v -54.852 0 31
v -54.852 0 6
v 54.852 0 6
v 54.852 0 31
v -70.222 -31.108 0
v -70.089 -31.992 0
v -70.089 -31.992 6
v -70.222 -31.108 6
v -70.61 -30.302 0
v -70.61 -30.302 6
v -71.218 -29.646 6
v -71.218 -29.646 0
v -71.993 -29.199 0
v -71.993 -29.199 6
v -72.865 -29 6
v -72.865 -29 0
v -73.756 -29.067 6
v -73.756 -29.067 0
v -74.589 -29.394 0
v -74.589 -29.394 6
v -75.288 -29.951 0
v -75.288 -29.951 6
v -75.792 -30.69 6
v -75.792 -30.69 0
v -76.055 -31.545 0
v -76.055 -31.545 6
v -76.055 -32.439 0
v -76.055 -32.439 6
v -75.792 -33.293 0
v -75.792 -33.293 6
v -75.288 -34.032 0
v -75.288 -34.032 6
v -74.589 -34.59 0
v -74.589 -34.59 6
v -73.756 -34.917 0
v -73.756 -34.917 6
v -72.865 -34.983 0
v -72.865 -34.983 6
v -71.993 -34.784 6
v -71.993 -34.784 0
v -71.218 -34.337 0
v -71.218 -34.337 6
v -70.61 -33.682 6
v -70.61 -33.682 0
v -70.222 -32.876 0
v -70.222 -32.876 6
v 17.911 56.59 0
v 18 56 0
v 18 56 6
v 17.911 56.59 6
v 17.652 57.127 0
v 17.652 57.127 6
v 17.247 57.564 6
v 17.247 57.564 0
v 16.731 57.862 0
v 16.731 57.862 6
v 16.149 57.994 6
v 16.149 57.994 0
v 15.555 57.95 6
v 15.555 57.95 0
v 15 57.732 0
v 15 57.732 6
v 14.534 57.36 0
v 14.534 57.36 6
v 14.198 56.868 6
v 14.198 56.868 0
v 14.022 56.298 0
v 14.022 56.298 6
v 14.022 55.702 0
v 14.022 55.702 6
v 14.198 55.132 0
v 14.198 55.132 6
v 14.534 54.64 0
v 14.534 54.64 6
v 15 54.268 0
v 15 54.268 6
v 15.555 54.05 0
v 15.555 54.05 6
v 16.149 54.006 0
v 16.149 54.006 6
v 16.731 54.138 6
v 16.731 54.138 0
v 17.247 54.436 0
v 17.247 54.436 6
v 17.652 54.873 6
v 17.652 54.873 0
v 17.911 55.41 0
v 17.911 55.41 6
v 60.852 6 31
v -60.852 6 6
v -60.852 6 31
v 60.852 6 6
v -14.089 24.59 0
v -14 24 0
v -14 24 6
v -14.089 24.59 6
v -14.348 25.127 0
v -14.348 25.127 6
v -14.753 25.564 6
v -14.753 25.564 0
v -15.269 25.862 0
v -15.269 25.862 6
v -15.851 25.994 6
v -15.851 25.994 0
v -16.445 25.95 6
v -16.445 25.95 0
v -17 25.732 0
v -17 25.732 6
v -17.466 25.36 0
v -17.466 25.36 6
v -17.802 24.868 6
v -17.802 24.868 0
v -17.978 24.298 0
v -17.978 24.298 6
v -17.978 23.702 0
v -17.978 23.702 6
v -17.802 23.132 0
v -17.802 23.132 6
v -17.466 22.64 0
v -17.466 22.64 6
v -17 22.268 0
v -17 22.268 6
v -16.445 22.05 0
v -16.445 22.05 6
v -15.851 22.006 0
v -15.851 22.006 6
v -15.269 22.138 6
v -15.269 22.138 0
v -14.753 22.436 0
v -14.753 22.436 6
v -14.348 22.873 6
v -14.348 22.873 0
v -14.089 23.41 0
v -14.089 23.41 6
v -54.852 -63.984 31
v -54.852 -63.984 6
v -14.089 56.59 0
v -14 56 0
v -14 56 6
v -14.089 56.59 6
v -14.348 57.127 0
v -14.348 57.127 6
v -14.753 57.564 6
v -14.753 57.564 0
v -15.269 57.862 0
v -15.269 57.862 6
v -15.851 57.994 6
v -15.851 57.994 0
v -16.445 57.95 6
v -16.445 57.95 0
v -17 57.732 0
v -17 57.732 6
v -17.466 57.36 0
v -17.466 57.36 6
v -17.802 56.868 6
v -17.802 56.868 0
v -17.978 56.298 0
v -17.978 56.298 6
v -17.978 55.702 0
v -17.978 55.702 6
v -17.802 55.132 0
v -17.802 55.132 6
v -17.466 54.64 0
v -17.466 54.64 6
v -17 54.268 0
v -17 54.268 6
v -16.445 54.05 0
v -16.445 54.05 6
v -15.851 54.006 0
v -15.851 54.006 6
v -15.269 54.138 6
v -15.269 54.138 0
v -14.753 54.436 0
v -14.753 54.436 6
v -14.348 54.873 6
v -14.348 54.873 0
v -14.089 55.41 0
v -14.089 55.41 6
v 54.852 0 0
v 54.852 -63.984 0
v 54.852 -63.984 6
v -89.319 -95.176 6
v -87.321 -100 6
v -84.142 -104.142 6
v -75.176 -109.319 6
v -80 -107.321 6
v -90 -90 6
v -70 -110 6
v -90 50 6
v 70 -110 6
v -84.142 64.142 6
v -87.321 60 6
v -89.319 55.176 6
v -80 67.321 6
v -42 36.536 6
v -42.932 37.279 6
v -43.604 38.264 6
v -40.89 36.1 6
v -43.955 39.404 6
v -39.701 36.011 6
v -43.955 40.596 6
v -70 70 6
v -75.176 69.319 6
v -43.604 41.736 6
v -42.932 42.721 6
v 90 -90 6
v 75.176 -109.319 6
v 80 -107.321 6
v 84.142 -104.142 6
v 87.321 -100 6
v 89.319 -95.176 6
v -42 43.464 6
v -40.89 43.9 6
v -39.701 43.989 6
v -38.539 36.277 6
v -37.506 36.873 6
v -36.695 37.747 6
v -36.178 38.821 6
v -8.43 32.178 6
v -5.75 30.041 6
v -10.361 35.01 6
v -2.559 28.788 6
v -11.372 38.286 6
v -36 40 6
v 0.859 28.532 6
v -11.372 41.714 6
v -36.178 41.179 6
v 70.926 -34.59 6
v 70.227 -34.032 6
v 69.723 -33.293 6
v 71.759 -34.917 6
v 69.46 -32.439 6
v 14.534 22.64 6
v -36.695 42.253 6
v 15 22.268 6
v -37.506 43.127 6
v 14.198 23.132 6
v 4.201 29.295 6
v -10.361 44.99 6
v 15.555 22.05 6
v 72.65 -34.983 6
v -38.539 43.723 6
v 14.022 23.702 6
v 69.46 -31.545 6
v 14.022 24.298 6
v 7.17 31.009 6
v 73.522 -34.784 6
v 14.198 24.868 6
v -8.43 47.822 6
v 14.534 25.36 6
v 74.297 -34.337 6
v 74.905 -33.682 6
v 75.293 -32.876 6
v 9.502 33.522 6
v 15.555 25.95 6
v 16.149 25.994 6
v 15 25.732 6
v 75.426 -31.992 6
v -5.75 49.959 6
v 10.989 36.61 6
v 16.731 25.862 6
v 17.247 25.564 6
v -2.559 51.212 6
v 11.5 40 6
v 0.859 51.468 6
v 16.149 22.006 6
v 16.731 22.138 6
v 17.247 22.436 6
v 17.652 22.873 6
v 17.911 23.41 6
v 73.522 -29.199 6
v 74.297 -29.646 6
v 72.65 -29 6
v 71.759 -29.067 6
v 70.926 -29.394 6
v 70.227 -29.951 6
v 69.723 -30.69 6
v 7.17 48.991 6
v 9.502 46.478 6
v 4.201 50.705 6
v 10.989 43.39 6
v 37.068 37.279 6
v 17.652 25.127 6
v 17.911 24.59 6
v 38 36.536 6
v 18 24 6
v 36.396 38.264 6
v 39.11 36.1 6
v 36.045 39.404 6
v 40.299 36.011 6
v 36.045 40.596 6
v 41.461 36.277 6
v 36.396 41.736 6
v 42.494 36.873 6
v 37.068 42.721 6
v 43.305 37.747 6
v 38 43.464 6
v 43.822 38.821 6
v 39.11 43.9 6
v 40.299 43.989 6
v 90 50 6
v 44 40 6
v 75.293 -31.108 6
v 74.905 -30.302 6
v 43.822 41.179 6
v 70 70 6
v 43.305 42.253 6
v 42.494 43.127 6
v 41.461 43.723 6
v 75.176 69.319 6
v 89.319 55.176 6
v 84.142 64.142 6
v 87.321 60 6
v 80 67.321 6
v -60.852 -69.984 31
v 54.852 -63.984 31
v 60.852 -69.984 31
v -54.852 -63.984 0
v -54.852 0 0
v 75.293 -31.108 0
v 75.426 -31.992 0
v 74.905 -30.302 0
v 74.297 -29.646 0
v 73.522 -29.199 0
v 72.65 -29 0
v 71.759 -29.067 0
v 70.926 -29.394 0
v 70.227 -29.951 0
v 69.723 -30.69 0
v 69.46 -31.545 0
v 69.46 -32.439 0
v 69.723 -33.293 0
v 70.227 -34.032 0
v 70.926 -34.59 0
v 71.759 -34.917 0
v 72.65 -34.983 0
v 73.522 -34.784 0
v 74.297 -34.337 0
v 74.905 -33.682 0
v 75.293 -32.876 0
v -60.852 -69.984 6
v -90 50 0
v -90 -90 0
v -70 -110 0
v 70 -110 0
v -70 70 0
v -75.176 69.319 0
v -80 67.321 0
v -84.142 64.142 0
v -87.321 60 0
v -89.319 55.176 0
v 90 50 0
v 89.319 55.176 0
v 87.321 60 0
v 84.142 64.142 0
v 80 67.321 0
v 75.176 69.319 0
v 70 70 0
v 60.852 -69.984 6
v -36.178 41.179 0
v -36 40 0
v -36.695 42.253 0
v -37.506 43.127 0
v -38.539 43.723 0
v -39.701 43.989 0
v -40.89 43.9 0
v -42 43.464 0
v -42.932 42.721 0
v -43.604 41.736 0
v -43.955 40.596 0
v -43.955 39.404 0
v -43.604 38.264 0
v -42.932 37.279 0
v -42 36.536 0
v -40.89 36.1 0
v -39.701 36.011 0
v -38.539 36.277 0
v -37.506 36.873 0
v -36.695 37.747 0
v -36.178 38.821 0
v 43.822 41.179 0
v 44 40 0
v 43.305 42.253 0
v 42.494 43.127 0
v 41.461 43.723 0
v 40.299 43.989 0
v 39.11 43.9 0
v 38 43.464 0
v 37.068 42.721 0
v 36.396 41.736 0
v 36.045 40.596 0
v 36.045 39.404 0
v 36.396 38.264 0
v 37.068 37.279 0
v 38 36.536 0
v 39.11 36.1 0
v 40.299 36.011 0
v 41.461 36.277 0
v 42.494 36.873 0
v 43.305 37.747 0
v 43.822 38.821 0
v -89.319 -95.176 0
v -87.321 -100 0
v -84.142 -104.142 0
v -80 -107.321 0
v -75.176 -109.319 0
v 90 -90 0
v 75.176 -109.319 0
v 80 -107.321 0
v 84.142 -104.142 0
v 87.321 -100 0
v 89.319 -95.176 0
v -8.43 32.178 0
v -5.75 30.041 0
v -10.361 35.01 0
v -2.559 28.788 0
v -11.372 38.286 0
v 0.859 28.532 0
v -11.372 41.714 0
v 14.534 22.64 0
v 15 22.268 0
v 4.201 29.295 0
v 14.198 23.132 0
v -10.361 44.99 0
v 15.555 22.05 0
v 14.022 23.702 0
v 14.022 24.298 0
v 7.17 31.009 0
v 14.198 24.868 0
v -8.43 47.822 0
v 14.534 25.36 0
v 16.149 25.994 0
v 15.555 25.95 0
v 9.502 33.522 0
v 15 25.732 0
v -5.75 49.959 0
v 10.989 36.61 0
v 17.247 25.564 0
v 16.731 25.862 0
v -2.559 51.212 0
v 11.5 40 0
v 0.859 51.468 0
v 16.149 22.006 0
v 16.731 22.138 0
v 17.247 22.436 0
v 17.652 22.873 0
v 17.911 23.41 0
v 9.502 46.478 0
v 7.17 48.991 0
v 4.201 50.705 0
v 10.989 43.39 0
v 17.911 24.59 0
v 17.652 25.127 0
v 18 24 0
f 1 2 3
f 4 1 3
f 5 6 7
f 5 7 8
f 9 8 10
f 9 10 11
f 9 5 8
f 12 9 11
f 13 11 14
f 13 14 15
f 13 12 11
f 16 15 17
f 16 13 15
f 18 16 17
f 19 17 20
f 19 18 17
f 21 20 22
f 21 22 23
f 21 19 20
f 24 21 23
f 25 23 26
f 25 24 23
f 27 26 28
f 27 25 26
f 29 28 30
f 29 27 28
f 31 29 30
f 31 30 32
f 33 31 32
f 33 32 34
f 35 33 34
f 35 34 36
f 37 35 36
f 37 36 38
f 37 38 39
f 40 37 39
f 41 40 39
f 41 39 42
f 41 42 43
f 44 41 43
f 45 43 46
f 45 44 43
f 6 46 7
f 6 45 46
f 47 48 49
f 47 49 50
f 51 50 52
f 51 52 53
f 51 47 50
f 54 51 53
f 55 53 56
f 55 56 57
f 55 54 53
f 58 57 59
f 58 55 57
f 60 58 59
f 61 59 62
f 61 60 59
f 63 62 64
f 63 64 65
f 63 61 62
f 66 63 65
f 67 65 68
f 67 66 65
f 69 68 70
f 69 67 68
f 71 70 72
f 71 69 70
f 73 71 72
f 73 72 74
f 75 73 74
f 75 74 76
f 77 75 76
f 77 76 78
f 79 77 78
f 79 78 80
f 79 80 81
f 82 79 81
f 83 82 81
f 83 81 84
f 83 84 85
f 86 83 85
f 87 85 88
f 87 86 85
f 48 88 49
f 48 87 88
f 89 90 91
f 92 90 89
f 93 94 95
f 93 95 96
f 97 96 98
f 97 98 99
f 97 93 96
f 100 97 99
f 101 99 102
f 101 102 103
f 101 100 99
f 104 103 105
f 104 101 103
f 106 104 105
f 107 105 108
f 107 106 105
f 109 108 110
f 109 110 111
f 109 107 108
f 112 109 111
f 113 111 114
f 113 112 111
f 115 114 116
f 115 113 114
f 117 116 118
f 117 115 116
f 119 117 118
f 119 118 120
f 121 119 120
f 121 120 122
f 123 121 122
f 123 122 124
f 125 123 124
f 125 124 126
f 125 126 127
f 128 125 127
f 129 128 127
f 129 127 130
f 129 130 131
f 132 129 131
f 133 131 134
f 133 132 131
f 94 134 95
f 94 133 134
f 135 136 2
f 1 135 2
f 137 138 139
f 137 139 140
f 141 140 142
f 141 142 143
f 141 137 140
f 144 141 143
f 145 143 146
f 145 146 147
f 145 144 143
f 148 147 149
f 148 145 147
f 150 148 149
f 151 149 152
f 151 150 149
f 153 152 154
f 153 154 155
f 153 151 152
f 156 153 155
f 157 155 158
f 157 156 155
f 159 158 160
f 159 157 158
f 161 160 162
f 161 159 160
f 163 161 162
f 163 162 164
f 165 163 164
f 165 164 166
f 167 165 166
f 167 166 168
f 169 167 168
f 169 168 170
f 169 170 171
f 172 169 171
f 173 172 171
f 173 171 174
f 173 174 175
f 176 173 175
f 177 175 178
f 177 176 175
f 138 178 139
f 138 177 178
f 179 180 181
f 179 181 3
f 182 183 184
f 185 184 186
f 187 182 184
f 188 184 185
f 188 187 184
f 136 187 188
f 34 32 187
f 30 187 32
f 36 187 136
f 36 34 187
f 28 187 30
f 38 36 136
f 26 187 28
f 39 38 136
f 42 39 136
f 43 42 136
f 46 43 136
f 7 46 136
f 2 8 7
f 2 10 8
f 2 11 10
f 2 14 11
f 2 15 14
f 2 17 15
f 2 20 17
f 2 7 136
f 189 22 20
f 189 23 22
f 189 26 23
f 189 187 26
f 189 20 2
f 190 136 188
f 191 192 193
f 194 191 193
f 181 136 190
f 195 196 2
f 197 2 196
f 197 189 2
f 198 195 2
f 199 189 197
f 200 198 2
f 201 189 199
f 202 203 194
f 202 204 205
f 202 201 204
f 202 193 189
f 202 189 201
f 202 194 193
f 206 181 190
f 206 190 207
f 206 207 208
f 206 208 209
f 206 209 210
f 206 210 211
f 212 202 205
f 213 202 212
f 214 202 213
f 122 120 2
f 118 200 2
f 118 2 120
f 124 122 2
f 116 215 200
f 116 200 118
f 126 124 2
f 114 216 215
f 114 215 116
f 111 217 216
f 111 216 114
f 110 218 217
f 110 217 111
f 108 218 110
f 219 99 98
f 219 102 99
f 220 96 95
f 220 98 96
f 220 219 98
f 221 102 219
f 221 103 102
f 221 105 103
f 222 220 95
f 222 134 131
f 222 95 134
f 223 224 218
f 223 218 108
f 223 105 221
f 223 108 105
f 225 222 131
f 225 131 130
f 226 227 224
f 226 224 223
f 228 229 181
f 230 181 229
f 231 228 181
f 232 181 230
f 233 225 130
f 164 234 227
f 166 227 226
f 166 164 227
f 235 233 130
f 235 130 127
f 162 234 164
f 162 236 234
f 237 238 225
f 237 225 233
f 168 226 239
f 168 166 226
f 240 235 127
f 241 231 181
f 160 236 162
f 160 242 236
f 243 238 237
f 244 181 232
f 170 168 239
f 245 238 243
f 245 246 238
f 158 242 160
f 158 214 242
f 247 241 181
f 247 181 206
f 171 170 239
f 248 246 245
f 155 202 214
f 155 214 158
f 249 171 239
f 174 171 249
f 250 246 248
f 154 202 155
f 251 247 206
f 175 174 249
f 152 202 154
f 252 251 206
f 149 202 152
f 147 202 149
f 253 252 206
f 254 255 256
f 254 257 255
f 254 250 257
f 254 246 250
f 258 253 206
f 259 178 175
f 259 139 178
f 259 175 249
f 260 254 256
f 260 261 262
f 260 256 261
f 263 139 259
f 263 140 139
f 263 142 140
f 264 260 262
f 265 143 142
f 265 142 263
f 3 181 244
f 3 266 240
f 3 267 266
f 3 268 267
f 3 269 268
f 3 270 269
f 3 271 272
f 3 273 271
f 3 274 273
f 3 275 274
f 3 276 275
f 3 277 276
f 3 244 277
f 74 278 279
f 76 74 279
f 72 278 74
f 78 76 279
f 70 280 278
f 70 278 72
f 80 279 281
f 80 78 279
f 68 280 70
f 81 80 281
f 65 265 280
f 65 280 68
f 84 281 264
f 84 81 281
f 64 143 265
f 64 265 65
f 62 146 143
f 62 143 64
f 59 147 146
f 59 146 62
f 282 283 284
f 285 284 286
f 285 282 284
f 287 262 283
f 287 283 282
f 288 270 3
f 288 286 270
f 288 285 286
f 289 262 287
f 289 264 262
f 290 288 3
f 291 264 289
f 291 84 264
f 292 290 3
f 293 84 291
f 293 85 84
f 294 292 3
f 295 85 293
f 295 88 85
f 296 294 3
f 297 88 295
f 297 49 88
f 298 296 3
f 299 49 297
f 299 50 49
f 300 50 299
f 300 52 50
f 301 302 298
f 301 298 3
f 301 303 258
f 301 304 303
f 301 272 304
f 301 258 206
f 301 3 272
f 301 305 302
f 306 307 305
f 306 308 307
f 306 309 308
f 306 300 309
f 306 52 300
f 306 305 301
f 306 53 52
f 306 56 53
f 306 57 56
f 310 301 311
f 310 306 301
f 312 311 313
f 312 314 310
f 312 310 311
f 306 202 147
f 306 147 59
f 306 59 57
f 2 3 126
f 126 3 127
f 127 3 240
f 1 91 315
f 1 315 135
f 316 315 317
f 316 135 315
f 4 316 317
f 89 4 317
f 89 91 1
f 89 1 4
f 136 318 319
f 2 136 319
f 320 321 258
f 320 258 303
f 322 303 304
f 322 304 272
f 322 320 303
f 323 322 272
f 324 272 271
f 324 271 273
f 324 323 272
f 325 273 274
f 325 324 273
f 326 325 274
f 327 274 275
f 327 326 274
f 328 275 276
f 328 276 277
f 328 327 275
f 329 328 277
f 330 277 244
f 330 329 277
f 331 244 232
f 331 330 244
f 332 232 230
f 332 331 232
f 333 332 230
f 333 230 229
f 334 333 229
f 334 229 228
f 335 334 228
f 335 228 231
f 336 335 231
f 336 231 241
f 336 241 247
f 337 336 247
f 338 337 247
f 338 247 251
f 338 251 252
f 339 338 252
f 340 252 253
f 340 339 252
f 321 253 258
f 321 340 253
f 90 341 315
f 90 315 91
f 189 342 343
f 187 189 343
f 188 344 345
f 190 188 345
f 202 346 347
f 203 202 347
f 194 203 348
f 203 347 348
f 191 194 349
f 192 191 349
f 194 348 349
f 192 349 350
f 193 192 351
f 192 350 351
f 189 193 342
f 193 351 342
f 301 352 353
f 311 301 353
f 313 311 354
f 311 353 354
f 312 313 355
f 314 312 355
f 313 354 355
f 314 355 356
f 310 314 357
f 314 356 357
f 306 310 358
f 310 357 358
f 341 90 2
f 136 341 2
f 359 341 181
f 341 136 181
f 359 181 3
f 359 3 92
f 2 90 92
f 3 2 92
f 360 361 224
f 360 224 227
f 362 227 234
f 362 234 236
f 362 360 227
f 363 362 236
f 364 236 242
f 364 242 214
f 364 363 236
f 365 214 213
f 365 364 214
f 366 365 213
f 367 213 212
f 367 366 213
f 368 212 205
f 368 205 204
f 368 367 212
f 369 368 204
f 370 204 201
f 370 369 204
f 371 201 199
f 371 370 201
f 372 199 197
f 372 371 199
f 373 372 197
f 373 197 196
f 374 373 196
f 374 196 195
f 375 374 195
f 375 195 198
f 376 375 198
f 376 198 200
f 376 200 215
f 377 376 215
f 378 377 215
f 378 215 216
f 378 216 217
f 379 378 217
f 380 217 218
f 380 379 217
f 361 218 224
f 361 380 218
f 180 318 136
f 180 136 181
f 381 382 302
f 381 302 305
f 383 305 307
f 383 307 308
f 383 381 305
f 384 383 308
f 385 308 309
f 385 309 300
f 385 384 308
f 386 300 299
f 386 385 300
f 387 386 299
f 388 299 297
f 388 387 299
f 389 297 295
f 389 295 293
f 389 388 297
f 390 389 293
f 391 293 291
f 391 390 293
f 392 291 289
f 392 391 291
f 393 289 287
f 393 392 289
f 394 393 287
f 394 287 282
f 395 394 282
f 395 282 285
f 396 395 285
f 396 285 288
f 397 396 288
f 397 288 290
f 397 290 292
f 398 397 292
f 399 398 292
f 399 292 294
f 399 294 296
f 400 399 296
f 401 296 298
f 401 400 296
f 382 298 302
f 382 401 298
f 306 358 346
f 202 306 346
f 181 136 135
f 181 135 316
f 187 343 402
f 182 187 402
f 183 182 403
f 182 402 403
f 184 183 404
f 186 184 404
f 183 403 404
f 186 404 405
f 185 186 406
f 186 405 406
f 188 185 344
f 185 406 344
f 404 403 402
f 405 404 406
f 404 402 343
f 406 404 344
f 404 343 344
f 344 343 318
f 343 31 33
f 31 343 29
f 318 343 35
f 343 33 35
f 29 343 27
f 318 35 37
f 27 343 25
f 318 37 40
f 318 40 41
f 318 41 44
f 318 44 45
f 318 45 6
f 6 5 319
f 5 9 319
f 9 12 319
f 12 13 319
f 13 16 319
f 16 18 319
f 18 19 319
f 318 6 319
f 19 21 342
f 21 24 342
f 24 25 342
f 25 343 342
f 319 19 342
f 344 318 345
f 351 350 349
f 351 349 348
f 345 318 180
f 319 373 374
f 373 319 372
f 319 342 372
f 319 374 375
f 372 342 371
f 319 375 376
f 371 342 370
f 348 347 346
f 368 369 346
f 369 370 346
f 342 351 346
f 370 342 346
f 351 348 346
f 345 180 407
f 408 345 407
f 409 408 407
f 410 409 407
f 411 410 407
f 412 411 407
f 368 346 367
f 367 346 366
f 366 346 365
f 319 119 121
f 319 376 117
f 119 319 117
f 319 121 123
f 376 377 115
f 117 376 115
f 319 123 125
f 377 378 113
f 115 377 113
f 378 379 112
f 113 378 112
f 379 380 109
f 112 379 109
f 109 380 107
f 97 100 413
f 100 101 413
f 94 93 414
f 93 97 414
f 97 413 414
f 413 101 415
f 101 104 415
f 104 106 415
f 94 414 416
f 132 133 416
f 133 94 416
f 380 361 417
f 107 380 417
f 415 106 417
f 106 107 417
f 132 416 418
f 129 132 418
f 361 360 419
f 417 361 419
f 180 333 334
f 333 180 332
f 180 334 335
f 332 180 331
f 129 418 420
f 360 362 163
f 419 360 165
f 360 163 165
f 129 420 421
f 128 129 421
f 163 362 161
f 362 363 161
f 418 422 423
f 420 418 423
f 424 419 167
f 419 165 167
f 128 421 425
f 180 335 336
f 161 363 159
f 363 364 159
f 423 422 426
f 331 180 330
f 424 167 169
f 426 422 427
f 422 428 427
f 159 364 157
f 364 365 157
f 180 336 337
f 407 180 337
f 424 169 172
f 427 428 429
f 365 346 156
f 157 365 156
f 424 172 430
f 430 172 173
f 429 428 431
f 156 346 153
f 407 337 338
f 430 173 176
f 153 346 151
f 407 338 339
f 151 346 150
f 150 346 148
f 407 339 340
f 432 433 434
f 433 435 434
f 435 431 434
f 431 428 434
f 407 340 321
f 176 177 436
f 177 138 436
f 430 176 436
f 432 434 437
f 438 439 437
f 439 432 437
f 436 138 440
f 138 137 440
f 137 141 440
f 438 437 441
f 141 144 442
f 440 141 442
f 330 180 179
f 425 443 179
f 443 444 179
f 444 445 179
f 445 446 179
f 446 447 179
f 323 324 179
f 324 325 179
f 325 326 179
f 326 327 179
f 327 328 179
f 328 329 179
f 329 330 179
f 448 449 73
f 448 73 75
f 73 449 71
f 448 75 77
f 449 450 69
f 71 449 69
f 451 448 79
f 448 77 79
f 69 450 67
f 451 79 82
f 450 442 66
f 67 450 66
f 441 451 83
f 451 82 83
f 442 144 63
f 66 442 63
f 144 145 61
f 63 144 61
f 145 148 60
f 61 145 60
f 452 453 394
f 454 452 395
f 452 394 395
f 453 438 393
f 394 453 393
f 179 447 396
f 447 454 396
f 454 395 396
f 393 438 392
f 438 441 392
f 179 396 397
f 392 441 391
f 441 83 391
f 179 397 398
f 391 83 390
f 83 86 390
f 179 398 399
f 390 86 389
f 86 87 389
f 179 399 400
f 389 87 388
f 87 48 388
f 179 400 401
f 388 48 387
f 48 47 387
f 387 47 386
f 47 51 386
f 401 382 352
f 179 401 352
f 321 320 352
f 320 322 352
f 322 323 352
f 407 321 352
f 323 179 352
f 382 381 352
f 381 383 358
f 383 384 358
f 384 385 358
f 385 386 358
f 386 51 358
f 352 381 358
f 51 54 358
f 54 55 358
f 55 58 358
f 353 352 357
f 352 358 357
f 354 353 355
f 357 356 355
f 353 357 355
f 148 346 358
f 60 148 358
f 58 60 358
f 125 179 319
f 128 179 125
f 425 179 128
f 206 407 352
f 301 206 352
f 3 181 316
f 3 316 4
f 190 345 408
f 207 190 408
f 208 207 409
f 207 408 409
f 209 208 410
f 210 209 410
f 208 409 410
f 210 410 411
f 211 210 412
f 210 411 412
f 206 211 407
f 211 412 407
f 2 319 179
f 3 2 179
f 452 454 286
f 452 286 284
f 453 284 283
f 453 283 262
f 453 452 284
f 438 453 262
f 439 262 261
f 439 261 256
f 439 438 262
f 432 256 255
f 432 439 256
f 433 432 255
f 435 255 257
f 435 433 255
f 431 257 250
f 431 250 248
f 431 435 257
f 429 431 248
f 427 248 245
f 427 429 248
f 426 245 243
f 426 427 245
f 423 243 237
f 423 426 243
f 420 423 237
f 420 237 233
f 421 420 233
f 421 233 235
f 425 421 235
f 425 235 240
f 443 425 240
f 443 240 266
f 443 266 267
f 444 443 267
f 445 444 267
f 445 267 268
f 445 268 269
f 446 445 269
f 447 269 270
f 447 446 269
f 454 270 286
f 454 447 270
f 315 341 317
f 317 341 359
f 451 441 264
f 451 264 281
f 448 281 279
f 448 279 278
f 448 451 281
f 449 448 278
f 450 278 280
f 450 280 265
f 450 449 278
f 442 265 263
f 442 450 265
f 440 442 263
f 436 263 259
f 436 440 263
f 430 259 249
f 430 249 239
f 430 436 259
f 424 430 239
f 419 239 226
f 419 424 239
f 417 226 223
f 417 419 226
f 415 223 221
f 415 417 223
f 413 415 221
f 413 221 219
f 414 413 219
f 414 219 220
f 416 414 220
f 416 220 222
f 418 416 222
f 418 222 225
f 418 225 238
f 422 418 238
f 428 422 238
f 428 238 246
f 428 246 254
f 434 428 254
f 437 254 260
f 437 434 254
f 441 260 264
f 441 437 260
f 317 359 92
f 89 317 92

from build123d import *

# Parameters (mm, degrees)
F0_R     = 3
F0_W     = 109.704602
F0_H     = 63.983593
F0_R_2   = 2
F0_R_3   = 4
F0_R_4   = 11.5
F1_DEPTH = 6
F2_W     = 121.704602
F2_H     = 75.983593
F2_W_2   = 109.704602
F2_H_2   = 63.983593
F3_DEPTH = 25


with BuildPart() as f1:
    # F0 (on Top) → F1 (new body)
    with BuildSketch(Plane.XY):
        with BuildLine():
            Line((70, 70), (-70, 70))
            ThreePointArc((-70, 70), (-84.142136, 64.142136), (-90, 50))
            Line((-90, 50), (-90, -90))
            ThreePointArc((-90, -90), (-84.142136, -104.142136), (-70, -110))
            Line((-70, -110), (70, -110))
            ThreePointArc((70, -110), (84.142136, -104.142136), (90, -90))
            Line((90, -90), (90, 50))
            ThreePointArc((90, 50), (84.142136, 64.142136), (70, 70))
        make_face()
        with Locations((-73.088898, -31.991797)):
            Circle(F0_R, mode=Mode.SUBTRACT)
        with Locations((0, -31.991796)):
            Rectangle(F0_W, F0_H, mode=Mode.SUBTRACT)
        with Locations((72.426151, -31.991797)):
            Circle(F0_R, mode=Mode.SUBTRACT)
        with Locations((-16, 24)):
            Circle(F0_R_2, mode=Mode.SUBTRACT)
        with Locations((-40, 40)):
            Circle(F0_R_3, mode=Mode.SUBTRACT)
        with Locations((-16, 56)):
            Circle(F0_R_2, mode=Mode.SUBTRACT)
        with Locations((16, 24)):
            Circle(F0_R_2, mode=Mode.SUBTRACT)
        with Locations((0, 40)):
            Circle(F0_R_4, mode=Mode.SUBTRACT)
        with Locations((40, 40)):
            Circle(F0_R_3, mode=Mode.SUBTRACT)
        with Locations((16, 56)):
            Circle(F0_R_2, mode=Mode.SUBTRACT)
    extrude(amount=F1_DEPTH)


with BuildPart() as f3:
    # F2 (on face) → F3 (new body)
    with BuildSketch(Plane.XY.offset(6)):
        with Locations((0, -31.991796)):
            Rectangle(F2_W, F2_H)
        with Locations((0, -31.991796)):
            Rectangle(F2_W_2, F2_H_2, mode=Mode.SUBTRACT)
    extrude(amount=F3_DEPTH)


solid = Compound([f1.part, f3.part])
